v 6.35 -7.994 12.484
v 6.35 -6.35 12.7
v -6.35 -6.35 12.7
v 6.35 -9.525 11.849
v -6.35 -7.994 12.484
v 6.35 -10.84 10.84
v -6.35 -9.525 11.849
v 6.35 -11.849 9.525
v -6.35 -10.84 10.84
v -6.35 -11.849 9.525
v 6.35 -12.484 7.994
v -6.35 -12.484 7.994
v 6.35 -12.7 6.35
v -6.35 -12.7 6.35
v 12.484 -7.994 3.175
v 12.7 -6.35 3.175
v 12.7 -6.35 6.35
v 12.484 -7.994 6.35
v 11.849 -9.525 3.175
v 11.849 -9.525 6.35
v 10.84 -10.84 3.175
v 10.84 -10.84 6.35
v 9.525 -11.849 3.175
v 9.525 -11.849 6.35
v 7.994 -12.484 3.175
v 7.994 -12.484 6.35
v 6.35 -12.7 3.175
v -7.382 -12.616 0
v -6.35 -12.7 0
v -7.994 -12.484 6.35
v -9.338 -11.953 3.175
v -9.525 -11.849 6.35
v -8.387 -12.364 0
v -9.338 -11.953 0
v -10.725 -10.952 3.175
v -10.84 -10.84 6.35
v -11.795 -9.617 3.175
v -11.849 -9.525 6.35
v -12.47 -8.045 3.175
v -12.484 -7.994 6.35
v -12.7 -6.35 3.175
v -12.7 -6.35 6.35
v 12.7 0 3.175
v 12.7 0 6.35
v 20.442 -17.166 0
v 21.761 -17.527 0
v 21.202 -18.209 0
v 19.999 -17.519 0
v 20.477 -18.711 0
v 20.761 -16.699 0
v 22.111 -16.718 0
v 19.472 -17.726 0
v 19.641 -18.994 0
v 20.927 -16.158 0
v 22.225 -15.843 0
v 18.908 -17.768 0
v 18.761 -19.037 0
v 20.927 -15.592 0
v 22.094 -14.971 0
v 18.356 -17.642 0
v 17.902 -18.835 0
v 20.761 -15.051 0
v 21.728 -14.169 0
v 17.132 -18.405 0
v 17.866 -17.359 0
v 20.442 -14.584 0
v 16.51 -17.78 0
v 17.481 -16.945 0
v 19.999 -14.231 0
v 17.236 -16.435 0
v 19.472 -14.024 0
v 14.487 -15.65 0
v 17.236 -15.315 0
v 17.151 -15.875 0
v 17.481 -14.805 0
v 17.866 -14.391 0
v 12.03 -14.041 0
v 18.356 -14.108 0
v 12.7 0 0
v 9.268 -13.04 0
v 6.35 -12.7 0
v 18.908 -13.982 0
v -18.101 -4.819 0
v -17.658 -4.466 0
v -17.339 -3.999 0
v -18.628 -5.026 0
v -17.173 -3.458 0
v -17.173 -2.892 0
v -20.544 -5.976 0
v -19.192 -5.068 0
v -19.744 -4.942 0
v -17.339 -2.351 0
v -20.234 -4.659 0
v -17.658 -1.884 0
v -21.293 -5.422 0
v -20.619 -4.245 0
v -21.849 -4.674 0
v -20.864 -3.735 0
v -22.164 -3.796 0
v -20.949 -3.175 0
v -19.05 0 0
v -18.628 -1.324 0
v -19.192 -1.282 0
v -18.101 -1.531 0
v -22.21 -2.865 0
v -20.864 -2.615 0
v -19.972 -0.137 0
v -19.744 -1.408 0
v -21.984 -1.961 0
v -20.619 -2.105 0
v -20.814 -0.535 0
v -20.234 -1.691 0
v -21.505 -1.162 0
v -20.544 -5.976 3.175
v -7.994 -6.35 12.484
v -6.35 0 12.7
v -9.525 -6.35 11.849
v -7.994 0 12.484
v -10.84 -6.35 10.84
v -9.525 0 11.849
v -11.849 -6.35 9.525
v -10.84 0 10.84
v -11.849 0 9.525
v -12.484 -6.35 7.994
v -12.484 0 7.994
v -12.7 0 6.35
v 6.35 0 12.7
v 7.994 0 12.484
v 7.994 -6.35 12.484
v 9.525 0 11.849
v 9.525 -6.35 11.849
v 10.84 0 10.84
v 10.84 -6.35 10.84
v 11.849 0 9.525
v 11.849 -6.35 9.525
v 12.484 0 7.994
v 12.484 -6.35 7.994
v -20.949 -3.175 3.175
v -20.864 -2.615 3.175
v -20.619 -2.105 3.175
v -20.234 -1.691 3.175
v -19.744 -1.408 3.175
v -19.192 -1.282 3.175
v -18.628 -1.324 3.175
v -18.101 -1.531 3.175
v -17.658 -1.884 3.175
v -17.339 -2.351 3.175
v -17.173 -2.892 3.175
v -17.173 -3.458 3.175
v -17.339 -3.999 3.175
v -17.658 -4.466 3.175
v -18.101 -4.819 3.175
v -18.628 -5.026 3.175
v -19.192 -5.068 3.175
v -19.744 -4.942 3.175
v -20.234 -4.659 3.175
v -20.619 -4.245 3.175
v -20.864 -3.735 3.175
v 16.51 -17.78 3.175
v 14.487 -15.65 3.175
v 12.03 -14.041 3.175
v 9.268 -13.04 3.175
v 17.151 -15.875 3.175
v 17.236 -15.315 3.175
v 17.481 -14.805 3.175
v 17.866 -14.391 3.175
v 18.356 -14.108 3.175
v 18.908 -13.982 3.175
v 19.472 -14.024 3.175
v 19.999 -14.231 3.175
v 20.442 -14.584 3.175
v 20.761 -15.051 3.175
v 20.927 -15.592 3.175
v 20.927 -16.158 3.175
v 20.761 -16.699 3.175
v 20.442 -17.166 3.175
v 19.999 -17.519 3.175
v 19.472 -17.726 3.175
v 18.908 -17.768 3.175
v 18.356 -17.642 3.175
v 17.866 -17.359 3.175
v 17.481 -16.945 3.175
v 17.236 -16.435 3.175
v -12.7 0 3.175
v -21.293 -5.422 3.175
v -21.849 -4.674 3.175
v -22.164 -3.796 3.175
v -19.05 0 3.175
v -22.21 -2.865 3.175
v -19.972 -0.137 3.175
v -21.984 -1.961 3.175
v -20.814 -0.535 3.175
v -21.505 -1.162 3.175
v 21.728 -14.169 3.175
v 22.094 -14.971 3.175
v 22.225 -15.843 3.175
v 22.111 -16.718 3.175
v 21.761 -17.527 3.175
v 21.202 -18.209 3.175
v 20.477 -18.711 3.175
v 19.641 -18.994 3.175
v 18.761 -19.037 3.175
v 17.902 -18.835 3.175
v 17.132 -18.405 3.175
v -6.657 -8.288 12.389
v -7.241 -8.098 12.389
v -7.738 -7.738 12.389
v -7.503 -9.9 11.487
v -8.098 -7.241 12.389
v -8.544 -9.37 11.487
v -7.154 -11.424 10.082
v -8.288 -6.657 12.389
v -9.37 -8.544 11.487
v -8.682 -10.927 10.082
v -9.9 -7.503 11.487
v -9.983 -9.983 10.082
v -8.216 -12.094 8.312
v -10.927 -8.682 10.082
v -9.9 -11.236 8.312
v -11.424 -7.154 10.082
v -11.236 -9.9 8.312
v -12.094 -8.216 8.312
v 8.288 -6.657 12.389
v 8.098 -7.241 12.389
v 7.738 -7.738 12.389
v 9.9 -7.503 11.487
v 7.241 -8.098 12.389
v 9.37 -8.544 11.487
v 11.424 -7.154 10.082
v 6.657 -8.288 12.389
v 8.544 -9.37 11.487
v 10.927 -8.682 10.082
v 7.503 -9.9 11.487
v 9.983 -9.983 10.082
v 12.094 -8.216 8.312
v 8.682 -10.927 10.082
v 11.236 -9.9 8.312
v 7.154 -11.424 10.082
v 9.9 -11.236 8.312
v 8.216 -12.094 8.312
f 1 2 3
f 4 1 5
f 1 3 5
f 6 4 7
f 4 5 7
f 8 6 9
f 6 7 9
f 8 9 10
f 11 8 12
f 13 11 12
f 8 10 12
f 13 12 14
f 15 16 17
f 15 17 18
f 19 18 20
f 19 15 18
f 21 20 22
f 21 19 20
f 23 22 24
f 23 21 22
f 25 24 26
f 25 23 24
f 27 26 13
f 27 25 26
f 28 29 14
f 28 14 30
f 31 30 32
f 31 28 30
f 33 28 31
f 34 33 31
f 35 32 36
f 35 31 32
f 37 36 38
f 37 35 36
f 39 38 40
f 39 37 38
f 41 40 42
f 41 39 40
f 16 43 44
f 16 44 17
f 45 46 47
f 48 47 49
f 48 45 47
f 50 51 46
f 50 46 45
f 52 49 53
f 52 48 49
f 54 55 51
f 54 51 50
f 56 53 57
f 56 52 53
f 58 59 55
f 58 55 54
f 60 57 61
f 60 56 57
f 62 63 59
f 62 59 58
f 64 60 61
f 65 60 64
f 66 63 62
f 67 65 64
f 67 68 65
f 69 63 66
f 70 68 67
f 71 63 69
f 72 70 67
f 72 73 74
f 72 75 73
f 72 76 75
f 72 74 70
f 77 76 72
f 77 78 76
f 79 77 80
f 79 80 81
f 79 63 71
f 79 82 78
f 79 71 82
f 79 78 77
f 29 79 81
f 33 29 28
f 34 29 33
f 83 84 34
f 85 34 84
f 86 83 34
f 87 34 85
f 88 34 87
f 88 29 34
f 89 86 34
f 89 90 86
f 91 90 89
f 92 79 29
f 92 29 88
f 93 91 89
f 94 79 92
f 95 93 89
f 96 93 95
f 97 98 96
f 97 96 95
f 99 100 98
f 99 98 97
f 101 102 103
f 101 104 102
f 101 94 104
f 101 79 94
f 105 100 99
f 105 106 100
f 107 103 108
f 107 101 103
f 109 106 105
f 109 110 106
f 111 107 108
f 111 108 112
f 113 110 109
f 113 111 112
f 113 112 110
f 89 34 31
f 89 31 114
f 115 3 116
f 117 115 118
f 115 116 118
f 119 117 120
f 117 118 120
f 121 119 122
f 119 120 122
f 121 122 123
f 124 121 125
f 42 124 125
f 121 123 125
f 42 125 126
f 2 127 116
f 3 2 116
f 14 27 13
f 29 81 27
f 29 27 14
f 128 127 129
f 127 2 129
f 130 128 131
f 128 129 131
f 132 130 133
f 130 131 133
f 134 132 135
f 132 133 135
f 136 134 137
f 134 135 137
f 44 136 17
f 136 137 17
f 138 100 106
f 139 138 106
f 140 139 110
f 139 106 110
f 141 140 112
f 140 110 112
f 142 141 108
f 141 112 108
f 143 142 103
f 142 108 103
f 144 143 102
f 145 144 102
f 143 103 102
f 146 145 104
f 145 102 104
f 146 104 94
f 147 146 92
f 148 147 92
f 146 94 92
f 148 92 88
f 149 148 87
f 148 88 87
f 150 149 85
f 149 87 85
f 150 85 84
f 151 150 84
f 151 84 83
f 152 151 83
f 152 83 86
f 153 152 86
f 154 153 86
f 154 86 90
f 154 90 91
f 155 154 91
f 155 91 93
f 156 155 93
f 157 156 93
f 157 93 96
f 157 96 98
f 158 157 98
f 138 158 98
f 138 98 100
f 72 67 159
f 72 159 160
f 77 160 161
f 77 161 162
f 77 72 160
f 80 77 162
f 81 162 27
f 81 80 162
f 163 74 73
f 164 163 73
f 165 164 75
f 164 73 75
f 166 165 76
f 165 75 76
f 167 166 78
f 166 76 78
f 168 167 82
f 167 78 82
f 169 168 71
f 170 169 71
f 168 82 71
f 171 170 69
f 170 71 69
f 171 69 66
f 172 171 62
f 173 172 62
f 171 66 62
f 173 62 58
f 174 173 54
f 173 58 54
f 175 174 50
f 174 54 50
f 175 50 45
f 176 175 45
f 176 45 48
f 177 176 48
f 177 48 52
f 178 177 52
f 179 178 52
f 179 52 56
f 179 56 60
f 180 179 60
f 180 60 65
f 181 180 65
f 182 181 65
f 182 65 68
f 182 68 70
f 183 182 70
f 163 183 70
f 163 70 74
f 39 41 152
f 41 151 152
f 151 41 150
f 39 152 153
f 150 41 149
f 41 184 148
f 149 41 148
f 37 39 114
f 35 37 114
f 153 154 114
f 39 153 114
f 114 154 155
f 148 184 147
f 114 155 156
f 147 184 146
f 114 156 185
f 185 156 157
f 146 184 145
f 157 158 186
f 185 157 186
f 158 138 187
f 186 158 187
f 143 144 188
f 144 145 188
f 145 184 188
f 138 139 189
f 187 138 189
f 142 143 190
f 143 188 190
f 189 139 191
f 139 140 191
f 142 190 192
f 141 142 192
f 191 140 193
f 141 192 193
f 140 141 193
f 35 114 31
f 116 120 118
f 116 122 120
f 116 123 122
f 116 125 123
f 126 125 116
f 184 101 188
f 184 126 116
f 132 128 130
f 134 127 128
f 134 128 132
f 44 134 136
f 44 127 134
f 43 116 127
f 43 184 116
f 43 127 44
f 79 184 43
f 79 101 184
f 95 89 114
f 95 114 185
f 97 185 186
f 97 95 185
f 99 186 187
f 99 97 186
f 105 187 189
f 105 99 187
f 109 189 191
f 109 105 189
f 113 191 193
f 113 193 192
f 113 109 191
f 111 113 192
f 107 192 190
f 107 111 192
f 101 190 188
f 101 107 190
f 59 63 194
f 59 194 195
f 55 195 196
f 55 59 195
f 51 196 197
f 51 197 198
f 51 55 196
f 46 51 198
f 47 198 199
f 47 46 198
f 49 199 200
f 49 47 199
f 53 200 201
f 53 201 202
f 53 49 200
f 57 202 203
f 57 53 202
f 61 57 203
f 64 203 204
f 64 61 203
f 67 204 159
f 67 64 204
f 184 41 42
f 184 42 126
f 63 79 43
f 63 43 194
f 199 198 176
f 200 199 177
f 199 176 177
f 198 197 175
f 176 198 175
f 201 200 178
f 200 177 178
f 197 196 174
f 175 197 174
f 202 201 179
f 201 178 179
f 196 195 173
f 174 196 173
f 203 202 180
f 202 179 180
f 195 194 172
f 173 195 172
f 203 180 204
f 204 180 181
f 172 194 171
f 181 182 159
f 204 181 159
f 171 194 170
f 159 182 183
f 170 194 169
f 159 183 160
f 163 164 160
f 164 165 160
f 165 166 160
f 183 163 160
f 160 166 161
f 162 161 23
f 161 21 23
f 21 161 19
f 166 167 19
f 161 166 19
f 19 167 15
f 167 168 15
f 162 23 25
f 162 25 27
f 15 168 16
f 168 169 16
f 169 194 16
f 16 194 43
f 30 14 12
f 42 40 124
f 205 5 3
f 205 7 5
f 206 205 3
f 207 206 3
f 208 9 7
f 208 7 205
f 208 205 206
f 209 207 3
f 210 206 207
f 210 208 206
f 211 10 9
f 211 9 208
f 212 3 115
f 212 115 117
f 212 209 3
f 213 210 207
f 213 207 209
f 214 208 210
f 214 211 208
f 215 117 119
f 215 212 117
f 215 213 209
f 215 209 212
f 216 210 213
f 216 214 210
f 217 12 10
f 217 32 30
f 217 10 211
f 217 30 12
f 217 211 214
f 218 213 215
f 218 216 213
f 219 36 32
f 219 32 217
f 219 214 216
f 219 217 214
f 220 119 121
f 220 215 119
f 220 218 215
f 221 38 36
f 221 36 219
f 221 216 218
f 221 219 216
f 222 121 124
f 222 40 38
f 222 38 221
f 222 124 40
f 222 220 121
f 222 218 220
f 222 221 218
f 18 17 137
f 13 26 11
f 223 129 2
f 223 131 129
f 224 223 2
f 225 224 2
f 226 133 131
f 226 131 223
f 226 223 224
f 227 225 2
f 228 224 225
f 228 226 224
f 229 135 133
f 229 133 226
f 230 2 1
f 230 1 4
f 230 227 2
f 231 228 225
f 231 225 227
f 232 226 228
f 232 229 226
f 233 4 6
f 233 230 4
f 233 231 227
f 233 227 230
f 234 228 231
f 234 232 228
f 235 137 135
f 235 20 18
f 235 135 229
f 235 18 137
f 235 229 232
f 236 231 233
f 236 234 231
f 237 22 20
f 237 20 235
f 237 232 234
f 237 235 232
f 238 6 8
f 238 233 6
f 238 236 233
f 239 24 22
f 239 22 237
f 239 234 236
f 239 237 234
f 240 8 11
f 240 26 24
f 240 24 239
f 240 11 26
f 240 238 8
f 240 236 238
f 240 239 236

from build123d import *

# Parameters (mm, degrees)
BOSS_EXTRUDE1_DEPTH   = 12.7
BOSS_EXTRUDE2_DEPTH   = 3.175
FILLET1_R             = 6.35
F_6_CLEARANCE_HOLE1_D = 3.7973


with BuildPart() as part:
    # Sketch1 → Boss-Extrude1 (new body)
    with BuildSketch(Plane.XY):
        with BuildLine():
            Line((-12.7, 0), (12.7, 0))
            Line((12.7, 0), (12.7, -6.35))
            ThreePointArc((12.7, -6.35), (10.840128061, -10.840128061), (6.35, -12.7))
            Line((6.35, -12.7), (-6.35, -12.7))
            ThreePointArc((-6.35, -12.7), (-10.840128061, -10.840128061), (-12.7, -6.35))
            Line((-12.7, -6.35), (-12.7, 0))
        make_face()
    extrude(amount=BOSS_EXTRUDE1_DEPTH)

    # Sketch2 → Boss-Extrude2 (add)
    with BuildSketch(Plane(origin=(0, 0, 0), x_dir=(-1, 0, 0), z_dir=(0, 0, -1))):
        with BuildLine():
            Line((12.7, 0), (12.7, -6.35))
            ThreePointArc((12.7, -6.35), (11.795080078, -9.617048047), (9.338235294, -11.952941176))
            Line((9.338235294, -11.952941176), (20.544117647, -5.976470588))
            ThreePointArc((20.544117647, -5.976470588), (22.130202438, -2.404949391), (19.05, 0))
            Line((19.05, 0), (12.7, 0))
        make_face()
        with BuildLine():
            Line((-12.7, 0), (-21.727676004, -14.168929598))
            ThreePointArc((-21.727676004, -14.168929598), (-20.856846986, -18.485733416), (-16.51, -17.78))
            ThreePointArc((-16.51, -17.78), (-12.029612663, -14.040774674), (-6.35, -12.7))
            ThreePointArc((-6.35, -12.7), (-10.840128061, -10.840128061), (-12.7, -6.35))
            Line((-12.7, -6.35), (-12.7, 0))
        make_face()
    extrude(amount=-BOSS_EXTRUDE2_DEPTH)

    # Fillet1
    fillet1_edges = [part.edges().sort_by_distance(p)[0] for p in [
        (-12.7, -3.175, 12.7),
        (-10.840128061, -10.840128061, 12.7),
        (0, -12.7, 12.7),
        (10.840128061, -10.840128061, 12.7),
        (12.7, -3.175, 12.7),
    ]]
    fillet(fillet1_edges, radius=FILLET1_R)

    # #6 Clearance Hole1 (through all)
    with Locations(Plane.XY.offset(3.175)):
        with Locations((-19.05, -3.175), (19.05, -15.875)):
            Hole(F_6_CLEARANCE_HOLE1_D / 2)


solid = part.part
